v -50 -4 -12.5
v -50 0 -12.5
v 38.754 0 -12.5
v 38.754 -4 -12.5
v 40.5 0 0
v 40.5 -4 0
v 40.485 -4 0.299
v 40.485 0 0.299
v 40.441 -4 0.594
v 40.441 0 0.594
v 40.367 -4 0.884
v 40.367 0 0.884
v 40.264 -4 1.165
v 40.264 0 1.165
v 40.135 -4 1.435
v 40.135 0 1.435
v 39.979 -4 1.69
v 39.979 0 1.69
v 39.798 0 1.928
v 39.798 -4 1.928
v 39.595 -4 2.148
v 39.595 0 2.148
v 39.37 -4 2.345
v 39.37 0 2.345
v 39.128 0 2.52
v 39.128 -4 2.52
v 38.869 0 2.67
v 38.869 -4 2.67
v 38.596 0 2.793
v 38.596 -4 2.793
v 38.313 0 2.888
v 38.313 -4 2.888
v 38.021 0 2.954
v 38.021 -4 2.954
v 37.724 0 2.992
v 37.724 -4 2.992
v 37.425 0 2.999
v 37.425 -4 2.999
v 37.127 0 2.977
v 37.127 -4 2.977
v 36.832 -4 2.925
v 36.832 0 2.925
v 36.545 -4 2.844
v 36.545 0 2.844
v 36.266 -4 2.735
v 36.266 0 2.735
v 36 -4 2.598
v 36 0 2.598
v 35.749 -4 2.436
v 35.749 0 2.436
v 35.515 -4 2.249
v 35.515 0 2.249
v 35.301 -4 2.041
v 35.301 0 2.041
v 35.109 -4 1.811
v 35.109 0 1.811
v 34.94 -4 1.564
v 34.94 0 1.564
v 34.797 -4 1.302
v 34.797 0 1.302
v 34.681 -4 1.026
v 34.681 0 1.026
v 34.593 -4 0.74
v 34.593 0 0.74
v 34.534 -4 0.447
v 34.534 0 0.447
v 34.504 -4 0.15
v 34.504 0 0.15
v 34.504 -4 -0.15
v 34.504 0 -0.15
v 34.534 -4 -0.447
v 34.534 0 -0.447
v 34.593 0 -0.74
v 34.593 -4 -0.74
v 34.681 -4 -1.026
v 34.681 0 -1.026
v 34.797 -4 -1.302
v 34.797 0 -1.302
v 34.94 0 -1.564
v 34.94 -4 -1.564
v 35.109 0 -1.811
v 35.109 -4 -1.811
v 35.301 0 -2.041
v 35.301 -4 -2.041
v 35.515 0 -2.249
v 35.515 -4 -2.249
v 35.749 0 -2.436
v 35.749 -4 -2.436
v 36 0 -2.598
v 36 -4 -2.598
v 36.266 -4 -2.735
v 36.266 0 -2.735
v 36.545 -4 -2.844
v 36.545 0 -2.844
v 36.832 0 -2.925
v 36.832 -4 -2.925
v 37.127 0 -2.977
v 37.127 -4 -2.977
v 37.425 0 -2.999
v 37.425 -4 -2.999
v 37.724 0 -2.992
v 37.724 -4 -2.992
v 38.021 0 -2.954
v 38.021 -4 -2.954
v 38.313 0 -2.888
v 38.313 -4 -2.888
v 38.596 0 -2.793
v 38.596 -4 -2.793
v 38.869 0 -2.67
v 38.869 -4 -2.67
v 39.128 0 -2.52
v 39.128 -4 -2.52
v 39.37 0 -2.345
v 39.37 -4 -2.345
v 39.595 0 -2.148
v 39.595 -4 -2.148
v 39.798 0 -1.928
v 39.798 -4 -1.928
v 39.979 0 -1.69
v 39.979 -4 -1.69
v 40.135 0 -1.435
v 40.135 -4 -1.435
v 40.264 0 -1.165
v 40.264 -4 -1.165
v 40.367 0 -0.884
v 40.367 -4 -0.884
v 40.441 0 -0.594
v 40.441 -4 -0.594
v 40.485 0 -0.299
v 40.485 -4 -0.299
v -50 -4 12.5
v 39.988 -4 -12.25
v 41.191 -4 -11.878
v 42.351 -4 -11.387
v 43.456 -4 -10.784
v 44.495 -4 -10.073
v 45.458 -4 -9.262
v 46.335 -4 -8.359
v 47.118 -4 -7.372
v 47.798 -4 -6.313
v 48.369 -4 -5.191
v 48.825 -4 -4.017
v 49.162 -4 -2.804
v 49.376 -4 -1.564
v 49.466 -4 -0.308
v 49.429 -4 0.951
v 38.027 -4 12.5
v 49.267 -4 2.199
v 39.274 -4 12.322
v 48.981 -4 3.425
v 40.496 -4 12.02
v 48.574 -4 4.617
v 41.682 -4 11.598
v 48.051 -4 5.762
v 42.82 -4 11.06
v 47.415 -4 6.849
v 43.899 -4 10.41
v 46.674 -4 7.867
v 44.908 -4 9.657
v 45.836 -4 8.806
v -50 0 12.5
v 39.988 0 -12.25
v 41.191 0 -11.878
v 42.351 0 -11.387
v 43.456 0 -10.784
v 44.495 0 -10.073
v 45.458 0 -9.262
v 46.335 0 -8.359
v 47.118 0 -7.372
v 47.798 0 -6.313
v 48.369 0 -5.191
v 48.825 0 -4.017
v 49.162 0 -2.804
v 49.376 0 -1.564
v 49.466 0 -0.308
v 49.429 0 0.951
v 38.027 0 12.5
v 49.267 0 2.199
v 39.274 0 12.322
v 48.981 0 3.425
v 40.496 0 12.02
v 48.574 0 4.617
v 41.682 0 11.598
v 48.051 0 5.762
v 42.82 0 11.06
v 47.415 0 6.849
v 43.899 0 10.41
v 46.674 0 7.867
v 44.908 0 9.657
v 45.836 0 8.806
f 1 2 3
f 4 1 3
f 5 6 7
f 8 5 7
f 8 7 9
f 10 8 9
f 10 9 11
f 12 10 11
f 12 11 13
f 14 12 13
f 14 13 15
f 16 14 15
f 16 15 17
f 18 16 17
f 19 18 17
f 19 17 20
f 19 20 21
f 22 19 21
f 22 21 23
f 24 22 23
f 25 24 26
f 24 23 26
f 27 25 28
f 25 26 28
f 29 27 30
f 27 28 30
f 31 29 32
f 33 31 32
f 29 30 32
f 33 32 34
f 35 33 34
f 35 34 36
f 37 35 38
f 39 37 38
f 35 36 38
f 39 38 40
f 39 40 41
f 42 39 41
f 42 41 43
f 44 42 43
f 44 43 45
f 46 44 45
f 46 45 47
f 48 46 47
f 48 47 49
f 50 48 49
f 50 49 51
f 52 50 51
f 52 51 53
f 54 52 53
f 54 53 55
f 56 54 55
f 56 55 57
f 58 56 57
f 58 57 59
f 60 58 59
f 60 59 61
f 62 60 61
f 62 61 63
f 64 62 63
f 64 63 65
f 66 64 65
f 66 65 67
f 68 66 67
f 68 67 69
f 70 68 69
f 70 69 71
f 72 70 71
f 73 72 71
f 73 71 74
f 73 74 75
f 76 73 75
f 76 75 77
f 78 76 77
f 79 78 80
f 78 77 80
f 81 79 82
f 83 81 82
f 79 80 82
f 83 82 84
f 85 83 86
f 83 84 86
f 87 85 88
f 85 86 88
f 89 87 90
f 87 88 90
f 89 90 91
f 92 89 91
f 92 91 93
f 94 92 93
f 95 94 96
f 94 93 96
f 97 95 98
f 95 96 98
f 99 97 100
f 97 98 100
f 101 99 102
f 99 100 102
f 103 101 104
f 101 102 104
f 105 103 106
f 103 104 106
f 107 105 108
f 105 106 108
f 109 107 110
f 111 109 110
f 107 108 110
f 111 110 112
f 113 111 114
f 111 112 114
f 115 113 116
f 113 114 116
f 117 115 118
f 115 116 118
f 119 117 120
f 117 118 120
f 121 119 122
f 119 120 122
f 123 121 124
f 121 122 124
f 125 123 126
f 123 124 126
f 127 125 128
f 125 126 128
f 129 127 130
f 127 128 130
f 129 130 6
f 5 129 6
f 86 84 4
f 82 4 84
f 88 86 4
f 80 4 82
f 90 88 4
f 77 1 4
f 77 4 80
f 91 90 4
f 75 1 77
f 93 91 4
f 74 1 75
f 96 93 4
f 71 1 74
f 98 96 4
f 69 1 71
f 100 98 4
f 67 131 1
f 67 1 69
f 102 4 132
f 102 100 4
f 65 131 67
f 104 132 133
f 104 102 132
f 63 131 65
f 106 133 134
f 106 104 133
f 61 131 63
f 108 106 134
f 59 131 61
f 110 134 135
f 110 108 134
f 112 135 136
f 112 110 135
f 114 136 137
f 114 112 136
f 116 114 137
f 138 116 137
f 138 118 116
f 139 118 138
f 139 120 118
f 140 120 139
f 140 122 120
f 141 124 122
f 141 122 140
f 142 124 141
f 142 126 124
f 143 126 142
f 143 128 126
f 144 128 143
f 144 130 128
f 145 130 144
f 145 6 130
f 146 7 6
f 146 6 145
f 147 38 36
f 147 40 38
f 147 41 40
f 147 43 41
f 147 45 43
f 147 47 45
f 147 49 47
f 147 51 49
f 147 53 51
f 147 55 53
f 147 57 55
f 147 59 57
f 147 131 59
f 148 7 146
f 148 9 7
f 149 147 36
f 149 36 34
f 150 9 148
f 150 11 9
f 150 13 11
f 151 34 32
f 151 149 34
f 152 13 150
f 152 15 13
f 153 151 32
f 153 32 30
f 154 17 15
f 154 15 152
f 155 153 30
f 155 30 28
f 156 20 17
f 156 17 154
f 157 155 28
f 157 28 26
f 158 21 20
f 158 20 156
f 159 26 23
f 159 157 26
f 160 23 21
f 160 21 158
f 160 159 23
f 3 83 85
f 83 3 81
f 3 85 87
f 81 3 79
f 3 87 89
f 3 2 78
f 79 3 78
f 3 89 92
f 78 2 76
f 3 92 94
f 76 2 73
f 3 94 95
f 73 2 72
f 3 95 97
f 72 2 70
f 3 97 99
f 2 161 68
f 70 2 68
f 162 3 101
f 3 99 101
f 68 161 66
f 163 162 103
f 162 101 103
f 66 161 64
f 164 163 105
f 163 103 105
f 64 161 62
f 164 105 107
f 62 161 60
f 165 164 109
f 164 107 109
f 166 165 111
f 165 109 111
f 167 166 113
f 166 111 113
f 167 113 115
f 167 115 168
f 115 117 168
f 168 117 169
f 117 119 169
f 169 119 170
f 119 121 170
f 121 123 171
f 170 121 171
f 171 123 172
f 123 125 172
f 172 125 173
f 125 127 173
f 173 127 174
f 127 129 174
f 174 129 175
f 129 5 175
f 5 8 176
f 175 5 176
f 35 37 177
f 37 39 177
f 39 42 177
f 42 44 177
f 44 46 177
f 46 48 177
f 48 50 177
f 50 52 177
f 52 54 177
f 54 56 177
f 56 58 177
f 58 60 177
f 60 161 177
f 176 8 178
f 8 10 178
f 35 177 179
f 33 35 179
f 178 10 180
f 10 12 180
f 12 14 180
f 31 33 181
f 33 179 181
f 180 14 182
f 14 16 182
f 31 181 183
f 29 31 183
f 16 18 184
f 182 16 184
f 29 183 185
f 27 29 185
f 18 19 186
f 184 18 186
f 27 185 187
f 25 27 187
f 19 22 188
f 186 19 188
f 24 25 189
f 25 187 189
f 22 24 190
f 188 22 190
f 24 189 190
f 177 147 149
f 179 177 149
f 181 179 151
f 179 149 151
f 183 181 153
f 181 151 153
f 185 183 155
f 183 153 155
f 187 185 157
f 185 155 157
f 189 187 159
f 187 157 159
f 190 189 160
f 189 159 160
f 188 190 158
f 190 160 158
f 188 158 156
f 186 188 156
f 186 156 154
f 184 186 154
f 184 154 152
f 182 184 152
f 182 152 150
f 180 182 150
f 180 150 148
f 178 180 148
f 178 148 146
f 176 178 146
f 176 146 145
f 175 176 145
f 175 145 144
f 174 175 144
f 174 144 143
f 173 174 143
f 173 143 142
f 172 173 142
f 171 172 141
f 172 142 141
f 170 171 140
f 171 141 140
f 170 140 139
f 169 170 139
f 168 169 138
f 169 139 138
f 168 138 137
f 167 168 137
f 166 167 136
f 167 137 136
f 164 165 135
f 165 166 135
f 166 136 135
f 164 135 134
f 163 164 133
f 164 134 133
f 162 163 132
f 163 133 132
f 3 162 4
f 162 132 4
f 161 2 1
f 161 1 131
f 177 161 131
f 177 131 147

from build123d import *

# Parameters (mm, degrees)
F0_W     = 100
F0_H     = 25
F1_DEPTH = 4
F4_DEPTH = 4.001
F2_R     = 3
F5_DEPTH = 4.001


with BuildPart() as f1:
    # F0 (on Front) → F1 (new body)
    with BuildSketch(Plane.XZ):
        Rectangle(F0_W, F0_H)
    extrude(amount=F1_DEPTH)

    # F3 (on face) → F4 (cut, through all)
    with BuildSketch(Plane.XZ.offset(4)):
        with BuildLine():
            ThreePointArc((38.027449, 12.5), (49.463037, 0.321938), (38.754359, -12.5))
            Line((38.754359, -12.5), (50, -12.5))
            Line((50, -12.5), (50, 12.5))
            Line((50, 12.5), (38.027449, 12.5))
        make_face()
    extrude(amount=-F4_DEPTH, mode=Mode.SUBTRACT)

    # F2 (on face) → F5 (cut, through all)
    with BuildSketch(Plane.XZ.offset(4)):
        with Locations((37.5, 0)):
            Circle(F2_R)
    extrude(amount=-F5_DEPTH, mode=Mode.SUBTRACT)


solid = f1.part
